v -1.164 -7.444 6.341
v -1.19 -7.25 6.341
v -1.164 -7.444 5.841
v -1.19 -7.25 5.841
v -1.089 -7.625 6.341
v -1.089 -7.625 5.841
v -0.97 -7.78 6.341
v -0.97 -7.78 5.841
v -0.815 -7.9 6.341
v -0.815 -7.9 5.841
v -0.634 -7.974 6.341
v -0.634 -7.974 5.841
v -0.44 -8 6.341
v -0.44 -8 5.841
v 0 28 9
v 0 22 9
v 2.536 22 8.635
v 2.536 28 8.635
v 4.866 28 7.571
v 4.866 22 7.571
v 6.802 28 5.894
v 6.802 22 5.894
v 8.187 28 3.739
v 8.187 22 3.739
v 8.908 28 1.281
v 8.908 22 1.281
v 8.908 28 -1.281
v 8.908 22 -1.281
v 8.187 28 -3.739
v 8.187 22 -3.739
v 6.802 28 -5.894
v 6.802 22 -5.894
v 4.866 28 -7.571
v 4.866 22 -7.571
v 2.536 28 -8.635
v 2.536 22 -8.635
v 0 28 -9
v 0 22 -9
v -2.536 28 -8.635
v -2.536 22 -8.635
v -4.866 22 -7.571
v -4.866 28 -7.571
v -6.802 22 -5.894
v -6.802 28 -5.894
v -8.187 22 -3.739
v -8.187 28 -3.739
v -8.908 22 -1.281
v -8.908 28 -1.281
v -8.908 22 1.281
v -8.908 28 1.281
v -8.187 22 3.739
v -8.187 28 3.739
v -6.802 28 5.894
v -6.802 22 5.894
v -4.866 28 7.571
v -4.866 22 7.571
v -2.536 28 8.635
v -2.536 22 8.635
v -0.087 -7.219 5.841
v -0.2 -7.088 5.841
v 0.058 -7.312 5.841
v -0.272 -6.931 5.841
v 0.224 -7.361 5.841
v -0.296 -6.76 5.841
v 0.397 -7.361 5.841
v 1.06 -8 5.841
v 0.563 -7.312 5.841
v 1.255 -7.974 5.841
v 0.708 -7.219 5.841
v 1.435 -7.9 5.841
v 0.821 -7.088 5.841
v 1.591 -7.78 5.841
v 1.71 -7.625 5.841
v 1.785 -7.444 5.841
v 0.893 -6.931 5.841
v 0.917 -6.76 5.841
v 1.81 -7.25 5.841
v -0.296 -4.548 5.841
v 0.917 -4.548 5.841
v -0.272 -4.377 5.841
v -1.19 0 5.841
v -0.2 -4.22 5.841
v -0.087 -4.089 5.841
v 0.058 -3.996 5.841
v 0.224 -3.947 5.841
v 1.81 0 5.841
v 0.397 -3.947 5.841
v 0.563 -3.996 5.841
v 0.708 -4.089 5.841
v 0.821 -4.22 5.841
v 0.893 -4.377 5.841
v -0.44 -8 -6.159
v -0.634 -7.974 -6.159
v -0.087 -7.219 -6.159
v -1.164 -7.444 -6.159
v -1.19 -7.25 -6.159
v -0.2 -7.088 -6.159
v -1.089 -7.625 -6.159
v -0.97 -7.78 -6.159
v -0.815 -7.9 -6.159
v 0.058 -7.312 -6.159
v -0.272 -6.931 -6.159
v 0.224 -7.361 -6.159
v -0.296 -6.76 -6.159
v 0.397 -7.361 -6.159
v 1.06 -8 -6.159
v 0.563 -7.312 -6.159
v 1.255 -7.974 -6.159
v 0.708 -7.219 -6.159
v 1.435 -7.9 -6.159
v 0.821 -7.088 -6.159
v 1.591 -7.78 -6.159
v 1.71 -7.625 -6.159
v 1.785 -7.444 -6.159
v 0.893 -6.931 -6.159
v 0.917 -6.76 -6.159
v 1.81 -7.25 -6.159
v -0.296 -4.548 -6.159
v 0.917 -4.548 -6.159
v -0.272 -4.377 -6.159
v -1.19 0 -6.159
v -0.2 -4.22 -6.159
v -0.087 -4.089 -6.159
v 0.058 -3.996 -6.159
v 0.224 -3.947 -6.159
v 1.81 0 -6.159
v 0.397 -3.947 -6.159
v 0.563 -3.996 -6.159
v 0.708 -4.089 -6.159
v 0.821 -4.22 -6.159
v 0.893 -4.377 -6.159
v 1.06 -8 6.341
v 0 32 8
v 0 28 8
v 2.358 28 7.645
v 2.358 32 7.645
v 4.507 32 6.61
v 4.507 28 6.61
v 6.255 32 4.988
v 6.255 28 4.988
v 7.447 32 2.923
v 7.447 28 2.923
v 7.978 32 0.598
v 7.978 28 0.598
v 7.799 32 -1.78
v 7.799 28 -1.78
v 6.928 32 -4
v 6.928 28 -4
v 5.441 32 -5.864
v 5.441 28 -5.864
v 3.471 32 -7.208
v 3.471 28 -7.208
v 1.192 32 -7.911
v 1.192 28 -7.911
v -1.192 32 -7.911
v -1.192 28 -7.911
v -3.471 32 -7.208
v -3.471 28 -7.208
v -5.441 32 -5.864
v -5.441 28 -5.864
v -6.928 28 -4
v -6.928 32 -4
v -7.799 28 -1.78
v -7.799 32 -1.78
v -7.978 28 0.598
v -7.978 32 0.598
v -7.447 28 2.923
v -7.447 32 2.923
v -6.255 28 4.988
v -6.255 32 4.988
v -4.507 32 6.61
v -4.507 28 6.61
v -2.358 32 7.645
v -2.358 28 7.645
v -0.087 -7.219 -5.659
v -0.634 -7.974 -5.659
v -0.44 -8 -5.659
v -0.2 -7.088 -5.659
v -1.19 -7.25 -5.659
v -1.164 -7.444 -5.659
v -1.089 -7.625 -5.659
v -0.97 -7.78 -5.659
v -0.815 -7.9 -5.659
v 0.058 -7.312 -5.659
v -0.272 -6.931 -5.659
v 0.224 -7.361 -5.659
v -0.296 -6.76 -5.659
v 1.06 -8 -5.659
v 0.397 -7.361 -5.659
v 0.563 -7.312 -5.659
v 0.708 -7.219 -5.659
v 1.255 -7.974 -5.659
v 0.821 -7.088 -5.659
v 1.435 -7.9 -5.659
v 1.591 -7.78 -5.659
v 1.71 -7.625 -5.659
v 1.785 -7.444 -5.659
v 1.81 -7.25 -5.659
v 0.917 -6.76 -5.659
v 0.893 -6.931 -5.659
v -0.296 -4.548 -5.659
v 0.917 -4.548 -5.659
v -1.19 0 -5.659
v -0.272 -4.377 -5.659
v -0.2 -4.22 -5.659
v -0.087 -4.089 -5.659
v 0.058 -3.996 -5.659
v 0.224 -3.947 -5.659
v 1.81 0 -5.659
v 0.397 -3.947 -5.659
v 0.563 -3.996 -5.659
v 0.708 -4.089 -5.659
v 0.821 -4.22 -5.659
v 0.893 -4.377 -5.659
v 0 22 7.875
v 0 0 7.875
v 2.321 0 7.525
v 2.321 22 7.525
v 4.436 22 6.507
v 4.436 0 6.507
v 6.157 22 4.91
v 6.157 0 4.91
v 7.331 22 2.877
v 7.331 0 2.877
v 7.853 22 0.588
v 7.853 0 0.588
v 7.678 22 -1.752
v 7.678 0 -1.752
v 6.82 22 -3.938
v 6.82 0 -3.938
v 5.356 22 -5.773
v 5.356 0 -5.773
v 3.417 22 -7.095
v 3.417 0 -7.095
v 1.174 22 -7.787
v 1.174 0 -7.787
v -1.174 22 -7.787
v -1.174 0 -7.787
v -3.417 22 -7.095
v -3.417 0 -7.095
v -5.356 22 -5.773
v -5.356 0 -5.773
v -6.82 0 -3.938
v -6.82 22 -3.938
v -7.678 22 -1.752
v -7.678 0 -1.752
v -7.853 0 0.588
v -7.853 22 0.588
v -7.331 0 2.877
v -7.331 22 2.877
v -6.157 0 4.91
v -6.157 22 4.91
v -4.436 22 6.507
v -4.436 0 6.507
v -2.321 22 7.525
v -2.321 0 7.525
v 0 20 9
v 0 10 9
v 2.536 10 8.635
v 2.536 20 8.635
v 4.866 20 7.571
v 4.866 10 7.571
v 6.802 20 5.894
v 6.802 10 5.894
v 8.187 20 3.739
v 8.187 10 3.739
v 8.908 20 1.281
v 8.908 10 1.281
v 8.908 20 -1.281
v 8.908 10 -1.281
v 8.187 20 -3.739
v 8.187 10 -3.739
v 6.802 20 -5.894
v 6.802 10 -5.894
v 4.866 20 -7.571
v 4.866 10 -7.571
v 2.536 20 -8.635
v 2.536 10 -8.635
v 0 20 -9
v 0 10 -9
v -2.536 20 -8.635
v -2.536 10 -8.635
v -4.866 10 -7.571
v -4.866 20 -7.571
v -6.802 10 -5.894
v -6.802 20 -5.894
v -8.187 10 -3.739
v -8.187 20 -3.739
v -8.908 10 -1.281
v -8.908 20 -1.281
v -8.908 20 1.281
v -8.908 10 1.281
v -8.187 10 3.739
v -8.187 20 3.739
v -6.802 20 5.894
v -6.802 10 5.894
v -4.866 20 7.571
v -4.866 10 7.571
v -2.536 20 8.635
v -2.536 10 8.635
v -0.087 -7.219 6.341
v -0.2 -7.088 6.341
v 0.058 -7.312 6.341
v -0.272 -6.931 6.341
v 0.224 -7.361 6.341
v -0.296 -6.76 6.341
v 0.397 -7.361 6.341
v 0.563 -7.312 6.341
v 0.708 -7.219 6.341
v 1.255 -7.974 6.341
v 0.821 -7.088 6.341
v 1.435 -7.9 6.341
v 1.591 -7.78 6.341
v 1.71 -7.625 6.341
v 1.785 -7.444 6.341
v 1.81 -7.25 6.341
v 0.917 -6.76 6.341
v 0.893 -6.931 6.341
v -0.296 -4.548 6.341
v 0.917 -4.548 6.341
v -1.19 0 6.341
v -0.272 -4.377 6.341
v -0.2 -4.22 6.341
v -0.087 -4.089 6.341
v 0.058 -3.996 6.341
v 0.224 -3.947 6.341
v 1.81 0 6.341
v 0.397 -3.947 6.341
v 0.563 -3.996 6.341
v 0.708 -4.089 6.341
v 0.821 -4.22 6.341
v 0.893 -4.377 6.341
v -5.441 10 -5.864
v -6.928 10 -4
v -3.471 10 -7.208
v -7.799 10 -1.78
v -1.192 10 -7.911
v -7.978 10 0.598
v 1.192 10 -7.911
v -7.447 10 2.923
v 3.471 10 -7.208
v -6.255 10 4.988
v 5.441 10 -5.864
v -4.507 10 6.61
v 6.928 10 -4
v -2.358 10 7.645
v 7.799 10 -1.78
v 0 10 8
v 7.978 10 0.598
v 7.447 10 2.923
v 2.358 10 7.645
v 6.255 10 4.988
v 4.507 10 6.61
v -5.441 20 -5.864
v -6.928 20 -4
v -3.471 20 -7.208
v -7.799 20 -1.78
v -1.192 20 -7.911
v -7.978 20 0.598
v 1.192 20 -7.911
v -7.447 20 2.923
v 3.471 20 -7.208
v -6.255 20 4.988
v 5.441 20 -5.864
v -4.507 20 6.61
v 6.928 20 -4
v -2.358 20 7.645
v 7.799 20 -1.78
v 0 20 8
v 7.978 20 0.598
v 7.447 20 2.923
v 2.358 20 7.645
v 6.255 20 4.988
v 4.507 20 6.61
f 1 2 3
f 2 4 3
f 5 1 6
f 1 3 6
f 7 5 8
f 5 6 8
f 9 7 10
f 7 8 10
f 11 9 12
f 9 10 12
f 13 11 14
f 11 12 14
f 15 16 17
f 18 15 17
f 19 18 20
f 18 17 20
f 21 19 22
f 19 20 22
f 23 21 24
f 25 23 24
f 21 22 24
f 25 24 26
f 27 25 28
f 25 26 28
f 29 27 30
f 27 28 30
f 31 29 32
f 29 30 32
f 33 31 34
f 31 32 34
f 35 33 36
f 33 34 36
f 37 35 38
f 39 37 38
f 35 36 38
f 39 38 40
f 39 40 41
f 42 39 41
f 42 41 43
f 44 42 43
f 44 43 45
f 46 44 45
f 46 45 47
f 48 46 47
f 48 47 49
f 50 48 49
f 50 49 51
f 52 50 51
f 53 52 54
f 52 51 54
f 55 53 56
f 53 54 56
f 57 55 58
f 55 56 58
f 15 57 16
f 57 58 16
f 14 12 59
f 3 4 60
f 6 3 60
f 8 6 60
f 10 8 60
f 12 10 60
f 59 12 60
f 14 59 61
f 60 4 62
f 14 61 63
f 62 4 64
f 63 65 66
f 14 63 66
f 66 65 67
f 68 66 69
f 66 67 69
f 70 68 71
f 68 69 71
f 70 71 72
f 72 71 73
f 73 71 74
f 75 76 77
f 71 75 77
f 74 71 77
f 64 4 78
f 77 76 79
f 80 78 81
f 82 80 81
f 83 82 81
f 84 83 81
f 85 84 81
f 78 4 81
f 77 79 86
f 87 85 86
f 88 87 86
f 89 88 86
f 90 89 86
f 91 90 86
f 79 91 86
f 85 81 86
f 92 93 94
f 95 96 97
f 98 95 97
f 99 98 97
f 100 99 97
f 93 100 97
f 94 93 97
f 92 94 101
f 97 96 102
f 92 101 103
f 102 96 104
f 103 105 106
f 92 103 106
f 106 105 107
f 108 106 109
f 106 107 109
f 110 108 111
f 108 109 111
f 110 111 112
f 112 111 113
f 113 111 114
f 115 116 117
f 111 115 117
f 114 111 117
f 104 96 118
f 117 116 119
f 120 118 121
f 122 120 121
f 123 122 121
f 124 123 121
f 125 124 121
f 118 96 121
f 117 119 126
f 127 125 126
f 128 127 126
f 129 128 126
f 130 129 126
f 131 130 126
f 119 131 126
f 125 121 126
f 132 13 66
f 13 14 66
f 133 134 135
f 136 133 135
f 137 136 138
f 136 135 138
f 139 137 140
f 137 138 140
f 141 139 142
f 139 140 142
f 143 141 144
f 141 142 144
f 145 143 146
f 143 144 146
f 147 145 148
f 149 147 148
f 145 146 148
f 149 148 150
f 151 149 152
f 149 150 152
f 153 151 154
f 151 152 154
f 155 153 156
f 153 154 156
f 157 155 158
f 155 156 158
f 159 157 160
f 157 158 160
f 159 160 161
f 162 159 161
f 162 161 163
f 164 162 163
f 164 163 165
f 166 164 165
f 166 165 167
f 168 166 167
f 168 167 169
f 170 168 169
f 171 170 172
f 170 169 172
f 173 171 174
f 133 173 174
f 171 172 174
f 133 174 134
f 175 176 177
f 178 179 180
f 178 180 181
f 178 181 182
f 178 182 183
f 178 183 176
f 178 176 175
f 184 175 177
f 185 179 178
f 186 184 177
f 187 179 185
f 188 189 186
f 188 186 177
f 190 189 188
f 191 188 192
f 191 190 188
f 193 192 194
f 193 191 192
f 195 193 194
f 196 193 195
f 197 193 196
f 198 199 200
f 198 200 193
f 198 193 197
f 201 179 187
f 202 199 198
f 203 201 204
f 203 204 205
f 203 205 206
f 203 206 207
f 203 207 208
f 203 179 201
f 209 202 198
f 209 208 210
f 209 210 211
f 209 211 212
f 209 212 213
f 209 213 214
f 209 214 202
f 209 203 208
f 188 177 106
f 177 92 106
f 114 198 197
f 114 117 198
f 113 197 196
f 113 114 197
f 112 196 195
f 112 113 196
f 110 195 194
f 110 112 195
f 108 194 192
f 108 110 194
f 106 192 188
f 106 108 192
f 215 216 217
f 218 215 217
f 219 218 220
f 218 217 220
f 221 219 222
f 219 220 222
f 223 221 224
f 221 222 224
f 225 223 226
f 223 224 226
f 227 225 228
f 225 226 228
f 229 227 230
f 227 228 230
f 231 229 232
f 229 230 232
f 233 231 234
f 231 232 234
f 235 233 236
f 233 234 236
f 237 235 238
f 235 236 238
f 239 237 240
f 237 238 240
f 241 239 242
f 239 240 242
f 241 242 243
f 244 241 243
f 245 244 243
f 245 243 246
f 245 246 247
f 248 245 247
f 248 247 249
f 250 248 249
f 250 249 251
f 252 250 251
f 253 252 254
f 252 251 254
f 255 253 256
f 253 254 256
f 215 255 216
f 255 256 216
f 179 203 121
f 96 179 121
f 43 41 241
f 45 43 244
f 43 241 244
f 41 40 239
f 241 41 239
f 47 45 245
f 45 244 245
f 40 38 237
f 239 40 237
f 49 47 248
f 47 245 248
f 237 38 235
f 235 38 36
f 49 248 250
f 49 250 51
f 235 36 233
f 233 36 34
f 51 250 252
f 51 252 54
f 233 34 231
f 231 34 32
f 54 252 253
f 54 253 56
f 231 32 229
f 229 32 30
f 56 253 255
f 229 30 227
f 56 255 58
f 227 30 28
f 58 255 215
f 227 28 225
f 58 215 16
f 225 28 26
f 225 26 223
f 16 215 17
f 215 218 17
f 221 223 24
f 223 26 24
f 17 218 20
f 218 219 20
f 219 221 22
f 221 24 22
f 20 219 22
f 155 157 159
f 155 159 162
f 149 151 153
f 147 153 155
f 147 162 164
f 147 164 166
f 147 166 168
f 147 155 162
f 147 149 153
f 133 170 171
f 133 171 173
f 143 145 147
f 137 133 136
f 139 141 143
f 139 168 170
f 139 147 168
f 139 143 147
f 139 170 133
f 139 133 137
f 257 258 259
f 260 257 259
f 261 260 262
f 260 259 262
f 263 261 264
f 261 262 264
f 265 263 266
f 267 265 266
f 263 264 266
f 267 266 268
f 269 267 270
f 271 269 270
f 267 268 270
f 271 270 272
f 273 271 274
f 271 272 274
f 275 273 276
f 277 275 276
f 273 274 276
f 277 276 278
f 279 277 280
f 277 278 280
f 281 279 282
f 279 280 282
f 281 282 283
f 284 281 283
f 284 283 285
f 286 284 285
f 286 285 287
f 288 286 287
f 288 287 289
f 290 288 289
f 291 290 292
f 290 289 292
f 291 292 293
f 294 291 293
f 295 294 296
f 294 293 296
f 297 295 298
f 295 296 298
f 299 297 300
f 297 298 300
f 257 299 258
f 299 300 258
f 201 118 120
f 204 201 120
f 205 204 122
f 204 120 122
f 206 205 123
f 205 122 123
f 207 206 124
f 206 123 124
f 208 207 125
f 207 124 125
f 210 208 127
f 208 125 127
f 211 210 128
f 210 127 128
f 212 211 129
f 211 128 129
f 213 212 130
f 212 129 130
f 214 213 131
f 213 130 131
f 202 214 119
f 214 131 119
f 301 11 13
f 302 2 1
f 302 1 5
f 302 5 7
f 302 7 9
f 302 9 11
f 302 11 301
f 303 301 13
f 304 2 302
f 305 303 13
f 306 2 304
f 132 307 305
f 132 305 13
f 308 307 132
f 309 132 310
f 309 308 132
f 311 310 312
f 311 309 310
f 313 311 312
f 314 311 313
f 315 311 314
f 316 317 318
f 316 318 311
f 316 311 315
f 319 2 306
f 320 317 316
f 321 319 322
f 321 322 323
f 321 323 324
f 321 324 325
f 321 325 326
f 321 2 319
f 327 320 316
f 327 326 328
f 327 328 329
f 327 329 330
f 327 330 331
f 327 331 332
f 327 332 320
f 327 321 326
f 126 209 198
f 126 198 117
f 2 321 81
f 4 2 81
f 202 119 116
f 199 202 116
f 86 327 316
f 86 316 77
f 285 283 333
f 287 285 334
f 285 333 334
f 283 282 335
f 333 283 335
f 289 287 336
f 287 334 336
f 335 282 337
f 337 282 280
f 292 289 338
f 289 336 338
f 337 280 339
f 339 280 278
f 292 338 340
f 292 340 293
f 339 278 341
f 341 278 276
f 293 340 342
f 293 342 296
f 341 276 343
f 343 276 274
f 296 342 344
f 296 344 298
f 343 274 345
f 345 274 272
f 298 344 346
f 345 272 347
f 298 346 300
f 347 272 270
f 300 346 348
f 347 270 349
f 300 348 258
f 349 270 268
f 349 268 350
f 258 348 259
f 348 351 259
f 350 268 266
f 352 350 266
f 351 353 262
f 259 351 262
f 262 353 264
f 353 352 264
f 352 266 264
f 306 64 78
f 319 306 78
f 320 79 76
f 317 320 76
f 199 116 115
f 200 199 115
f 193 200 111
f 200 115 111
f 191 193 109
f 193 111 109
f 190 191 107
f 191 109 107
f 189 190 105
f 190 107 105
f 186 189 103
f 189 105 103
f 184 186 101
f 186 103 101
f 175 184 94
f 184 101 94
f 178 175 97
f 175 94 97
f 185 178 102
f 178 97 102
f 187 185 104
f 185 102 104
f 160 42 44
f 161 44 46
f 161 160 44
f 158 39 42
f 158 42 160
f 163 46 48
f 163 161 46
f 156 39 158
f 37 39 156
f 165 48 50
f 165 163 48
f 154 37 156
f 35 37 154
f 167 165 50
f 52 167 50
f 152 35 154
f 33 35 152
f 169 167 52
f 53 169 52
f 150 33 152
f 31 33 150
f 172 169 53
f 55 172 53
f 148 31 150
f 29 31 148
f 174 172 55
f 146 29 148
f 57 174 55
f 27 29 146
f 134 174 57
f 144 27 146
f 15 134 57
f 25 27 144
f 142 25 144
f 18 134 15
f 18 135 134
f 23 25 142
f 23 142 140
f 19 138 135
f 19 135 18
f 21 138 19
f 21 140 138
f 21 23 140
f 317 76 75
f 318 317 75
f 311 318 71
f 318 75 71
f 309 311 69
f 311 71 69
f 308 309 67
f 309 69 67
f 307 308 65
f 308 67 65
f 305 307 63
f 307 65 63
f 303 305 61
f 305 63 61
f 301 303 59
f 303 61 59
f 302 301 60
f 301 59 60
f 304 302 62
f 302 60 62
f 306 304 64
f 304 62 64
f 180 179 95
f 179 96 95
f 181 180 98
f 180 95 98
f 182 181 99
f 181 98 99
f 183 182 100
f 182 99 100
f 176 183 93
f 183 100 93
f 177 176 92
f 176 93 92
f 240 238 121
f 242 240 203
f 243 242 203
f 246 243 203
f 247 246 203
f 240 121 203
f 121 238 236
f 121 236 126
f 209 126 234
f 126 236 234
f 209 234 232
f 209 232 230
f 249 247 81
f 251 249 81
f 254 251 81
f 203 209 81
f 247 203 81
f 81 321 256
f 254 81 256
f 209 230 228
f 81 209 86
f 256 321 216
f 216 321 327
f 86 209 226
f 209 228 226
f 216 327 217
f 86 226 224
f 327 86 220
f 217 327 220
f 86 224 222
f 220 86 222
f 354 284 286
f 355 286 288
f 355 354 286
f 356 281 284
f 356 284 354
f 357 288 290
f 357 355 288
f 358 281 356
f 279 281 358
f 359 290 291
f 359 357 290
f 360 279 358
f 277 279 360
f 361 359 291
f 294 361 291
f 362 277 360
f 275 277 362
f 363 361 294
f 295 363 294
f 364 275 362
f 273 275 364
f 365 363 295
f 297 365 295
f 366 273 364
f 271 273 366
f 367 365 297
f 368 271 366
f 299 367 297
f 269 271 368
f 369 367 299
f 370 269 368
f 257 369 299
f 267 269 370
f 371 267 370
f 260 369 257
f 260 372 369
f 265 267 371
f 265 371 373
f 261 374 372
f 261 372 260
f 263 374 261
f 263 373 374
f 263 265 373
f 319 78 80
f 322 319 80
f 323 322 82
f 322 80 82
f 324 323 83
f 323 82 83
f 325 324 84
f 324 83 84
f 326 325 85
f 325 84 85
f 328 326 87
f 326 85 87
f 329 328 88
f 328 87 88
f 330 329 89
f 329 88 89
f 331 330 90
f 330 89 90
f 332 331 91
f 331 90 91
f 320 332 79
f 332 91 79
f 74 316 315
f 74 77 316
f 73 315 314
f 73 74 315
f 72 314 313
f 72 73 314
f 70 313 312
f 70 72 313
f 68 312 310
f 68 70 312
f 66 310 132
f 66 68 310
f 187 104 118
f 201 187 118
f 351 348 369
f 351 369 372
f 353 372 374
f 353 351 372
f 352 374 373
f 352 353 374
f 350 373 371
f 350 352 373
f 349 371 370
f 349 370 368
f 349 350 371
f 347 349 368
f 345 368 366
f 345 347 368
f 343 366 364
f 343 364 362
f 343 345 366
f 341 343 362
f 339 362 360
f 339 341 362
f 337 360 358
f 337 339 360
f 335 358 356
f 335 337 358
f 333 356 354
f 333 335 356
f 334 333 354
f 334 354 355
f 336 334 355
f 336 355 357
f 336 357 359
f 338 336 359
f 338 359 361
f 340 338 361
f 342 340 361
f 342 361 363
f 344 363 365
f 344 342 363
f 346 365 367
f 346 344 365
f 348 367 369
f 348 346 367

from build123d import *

# Parameters (mm, degrees)
SKETCH2_R           = 7.875
BOSS_EXTRUDE1_DEPTH = 22
BOSS_EXTRUDE2_START = 22
SKETCH4_R           = 9
BOSS_EXTRUDE2_DEPTH = 6
BOSS_EXTRUDE3_START = 28
SKETCH5_R           = 8
BOSS_EXTRUDE3_DEPTH = 4
SKETCH6_W           = 3
SKETCH6_H           = 0.5
BOSS_EXTRUDE4_DEPTH = 8
FILLET2_R           = 0.75
CUT_EXTRUDE1_DEPTH  = 37.534860886
BOSS_EXTRUDE5_START = 10
SKETCH11_R          = 9
SKETCH11_R_2        = 8
BOSS_EXTRUDE5_DEPTH = 10


with BuildPart() as part:
    # Sketch2 → Boss-Extrude1 (new body)
    with BuildSketch(Plane(origin=(0, 0, 0), x_dir=(1, 0, 0), z_dir=(0, 1, 0))):
        with Locations(Location((0, 0, 0), (0, 0, 270))):
            Circle(SKETCH2_R)
    extrude(amount=BOSS_EXTRUDE1_DEPTH)

    # Sketch4 → Boss-Extrude2 (add)
    with BuildSketch(Plane(origin=(0, 0, 0), x_dir=(1, 0, 0), z_dir=(0, 1, 0)).offset(BOSS_EXTRUDE2_START)):
        with Locations(Location((0, 0, 0), (0, 0, 270))):
            Circle(SKETCH4_R)
    extrude(amount=BOSS_EXTRUDE2_DEPTH)

    # Sketch5 → Boss-Extrude3 (add)
    with BuildSketch(Plane(origin=(0, 0, 0), x_dir=(1, 0, 0), z_dir=(0, 1, 0)).offset(BOSS_EXTRUDE3_START)):
        with Locations(Location((0, 0, 0), (0, 0, 270))):
            Circle(SKETCH5_R)
    extrude(amount=BOSS_EXTRUDE3_DEPTH)

    # Sketch6 → Boss-Extrude4 (add)
    with BuildSketch(Plane(origin=(0, 0, 0), x_dir=(1, 0, 0), z_dir=(0, 1, 0))):
        with Locations((0.3104886, 5.909025693)):
            Rectangle(SKETCH6_W, SKETCH6_H)
        with Locations((0.3104886, -6.090974307)):
            Rectangle(SKETCH6_W, SKETCH6_H)
    extrude(amount=-BOSS_EXTRUDE4_DEPTH)

    # Fillet2
    fillet2_edges = [part.edges().sort_by_distance(p)[0] for p in [
        (1.8104886, -8, -5.909025693),
        (-1.1895114, -8, -5.909025693),
        (1.8104886, -8, 6.090974307),
        (-1.1895114, -8, 6.090974307),
    ]]
    fillet(fillet2_edges, radius=FILLET2_R)

    # Sketch7 → Cut-Extrude1 (cut, through all)
    with BuildSketch(Plane.XY.offset(-6.159025693)):
        with BuildLine():
            Line((-0.296359001, -6.760155081), (-0.296359001, -4.547883008))
            ThreePointArc((-0.296359001, -4.547883008), (0.3104886, -3.941035407), (0.917336202, -4.547883008))
            Line((0.917336202, -4.547883008), (0.917336202, -6.760155081))
            ThreePointArc((0.917336202, -6.760155081), (0.3104886, -7.367002682), (-0.296359001, -6.760155081))
        make_face()
    extrude(amount=CUT_EXTRUDE1_DEPTH, mode=Mode.SUBTRACT)


with BuildPart() as body_2:
    # Sketch11 → Boss-Extrude5 (new body)
    with BuildSketch(Plane(origin=(0, 0, 0), x_dir=(1, 0, 0), z_dir=(0, 1, 0)).offset(BOSS_EXTRUDE5_START)):
        with Locations(Location((0, 0, 0), (0, 0, 270))):
            Circle(SKETCH11_R)
        with Locations(Location((0, 0, 0), (0, 0, 270))):
            Circle(SKETCH11_R_2, mode=Mode.SUBTRACT)
    extrude(amount=BOSS_EXTRUDE5_DEPTH)


solid = Compound([part.part, body_2.part])
